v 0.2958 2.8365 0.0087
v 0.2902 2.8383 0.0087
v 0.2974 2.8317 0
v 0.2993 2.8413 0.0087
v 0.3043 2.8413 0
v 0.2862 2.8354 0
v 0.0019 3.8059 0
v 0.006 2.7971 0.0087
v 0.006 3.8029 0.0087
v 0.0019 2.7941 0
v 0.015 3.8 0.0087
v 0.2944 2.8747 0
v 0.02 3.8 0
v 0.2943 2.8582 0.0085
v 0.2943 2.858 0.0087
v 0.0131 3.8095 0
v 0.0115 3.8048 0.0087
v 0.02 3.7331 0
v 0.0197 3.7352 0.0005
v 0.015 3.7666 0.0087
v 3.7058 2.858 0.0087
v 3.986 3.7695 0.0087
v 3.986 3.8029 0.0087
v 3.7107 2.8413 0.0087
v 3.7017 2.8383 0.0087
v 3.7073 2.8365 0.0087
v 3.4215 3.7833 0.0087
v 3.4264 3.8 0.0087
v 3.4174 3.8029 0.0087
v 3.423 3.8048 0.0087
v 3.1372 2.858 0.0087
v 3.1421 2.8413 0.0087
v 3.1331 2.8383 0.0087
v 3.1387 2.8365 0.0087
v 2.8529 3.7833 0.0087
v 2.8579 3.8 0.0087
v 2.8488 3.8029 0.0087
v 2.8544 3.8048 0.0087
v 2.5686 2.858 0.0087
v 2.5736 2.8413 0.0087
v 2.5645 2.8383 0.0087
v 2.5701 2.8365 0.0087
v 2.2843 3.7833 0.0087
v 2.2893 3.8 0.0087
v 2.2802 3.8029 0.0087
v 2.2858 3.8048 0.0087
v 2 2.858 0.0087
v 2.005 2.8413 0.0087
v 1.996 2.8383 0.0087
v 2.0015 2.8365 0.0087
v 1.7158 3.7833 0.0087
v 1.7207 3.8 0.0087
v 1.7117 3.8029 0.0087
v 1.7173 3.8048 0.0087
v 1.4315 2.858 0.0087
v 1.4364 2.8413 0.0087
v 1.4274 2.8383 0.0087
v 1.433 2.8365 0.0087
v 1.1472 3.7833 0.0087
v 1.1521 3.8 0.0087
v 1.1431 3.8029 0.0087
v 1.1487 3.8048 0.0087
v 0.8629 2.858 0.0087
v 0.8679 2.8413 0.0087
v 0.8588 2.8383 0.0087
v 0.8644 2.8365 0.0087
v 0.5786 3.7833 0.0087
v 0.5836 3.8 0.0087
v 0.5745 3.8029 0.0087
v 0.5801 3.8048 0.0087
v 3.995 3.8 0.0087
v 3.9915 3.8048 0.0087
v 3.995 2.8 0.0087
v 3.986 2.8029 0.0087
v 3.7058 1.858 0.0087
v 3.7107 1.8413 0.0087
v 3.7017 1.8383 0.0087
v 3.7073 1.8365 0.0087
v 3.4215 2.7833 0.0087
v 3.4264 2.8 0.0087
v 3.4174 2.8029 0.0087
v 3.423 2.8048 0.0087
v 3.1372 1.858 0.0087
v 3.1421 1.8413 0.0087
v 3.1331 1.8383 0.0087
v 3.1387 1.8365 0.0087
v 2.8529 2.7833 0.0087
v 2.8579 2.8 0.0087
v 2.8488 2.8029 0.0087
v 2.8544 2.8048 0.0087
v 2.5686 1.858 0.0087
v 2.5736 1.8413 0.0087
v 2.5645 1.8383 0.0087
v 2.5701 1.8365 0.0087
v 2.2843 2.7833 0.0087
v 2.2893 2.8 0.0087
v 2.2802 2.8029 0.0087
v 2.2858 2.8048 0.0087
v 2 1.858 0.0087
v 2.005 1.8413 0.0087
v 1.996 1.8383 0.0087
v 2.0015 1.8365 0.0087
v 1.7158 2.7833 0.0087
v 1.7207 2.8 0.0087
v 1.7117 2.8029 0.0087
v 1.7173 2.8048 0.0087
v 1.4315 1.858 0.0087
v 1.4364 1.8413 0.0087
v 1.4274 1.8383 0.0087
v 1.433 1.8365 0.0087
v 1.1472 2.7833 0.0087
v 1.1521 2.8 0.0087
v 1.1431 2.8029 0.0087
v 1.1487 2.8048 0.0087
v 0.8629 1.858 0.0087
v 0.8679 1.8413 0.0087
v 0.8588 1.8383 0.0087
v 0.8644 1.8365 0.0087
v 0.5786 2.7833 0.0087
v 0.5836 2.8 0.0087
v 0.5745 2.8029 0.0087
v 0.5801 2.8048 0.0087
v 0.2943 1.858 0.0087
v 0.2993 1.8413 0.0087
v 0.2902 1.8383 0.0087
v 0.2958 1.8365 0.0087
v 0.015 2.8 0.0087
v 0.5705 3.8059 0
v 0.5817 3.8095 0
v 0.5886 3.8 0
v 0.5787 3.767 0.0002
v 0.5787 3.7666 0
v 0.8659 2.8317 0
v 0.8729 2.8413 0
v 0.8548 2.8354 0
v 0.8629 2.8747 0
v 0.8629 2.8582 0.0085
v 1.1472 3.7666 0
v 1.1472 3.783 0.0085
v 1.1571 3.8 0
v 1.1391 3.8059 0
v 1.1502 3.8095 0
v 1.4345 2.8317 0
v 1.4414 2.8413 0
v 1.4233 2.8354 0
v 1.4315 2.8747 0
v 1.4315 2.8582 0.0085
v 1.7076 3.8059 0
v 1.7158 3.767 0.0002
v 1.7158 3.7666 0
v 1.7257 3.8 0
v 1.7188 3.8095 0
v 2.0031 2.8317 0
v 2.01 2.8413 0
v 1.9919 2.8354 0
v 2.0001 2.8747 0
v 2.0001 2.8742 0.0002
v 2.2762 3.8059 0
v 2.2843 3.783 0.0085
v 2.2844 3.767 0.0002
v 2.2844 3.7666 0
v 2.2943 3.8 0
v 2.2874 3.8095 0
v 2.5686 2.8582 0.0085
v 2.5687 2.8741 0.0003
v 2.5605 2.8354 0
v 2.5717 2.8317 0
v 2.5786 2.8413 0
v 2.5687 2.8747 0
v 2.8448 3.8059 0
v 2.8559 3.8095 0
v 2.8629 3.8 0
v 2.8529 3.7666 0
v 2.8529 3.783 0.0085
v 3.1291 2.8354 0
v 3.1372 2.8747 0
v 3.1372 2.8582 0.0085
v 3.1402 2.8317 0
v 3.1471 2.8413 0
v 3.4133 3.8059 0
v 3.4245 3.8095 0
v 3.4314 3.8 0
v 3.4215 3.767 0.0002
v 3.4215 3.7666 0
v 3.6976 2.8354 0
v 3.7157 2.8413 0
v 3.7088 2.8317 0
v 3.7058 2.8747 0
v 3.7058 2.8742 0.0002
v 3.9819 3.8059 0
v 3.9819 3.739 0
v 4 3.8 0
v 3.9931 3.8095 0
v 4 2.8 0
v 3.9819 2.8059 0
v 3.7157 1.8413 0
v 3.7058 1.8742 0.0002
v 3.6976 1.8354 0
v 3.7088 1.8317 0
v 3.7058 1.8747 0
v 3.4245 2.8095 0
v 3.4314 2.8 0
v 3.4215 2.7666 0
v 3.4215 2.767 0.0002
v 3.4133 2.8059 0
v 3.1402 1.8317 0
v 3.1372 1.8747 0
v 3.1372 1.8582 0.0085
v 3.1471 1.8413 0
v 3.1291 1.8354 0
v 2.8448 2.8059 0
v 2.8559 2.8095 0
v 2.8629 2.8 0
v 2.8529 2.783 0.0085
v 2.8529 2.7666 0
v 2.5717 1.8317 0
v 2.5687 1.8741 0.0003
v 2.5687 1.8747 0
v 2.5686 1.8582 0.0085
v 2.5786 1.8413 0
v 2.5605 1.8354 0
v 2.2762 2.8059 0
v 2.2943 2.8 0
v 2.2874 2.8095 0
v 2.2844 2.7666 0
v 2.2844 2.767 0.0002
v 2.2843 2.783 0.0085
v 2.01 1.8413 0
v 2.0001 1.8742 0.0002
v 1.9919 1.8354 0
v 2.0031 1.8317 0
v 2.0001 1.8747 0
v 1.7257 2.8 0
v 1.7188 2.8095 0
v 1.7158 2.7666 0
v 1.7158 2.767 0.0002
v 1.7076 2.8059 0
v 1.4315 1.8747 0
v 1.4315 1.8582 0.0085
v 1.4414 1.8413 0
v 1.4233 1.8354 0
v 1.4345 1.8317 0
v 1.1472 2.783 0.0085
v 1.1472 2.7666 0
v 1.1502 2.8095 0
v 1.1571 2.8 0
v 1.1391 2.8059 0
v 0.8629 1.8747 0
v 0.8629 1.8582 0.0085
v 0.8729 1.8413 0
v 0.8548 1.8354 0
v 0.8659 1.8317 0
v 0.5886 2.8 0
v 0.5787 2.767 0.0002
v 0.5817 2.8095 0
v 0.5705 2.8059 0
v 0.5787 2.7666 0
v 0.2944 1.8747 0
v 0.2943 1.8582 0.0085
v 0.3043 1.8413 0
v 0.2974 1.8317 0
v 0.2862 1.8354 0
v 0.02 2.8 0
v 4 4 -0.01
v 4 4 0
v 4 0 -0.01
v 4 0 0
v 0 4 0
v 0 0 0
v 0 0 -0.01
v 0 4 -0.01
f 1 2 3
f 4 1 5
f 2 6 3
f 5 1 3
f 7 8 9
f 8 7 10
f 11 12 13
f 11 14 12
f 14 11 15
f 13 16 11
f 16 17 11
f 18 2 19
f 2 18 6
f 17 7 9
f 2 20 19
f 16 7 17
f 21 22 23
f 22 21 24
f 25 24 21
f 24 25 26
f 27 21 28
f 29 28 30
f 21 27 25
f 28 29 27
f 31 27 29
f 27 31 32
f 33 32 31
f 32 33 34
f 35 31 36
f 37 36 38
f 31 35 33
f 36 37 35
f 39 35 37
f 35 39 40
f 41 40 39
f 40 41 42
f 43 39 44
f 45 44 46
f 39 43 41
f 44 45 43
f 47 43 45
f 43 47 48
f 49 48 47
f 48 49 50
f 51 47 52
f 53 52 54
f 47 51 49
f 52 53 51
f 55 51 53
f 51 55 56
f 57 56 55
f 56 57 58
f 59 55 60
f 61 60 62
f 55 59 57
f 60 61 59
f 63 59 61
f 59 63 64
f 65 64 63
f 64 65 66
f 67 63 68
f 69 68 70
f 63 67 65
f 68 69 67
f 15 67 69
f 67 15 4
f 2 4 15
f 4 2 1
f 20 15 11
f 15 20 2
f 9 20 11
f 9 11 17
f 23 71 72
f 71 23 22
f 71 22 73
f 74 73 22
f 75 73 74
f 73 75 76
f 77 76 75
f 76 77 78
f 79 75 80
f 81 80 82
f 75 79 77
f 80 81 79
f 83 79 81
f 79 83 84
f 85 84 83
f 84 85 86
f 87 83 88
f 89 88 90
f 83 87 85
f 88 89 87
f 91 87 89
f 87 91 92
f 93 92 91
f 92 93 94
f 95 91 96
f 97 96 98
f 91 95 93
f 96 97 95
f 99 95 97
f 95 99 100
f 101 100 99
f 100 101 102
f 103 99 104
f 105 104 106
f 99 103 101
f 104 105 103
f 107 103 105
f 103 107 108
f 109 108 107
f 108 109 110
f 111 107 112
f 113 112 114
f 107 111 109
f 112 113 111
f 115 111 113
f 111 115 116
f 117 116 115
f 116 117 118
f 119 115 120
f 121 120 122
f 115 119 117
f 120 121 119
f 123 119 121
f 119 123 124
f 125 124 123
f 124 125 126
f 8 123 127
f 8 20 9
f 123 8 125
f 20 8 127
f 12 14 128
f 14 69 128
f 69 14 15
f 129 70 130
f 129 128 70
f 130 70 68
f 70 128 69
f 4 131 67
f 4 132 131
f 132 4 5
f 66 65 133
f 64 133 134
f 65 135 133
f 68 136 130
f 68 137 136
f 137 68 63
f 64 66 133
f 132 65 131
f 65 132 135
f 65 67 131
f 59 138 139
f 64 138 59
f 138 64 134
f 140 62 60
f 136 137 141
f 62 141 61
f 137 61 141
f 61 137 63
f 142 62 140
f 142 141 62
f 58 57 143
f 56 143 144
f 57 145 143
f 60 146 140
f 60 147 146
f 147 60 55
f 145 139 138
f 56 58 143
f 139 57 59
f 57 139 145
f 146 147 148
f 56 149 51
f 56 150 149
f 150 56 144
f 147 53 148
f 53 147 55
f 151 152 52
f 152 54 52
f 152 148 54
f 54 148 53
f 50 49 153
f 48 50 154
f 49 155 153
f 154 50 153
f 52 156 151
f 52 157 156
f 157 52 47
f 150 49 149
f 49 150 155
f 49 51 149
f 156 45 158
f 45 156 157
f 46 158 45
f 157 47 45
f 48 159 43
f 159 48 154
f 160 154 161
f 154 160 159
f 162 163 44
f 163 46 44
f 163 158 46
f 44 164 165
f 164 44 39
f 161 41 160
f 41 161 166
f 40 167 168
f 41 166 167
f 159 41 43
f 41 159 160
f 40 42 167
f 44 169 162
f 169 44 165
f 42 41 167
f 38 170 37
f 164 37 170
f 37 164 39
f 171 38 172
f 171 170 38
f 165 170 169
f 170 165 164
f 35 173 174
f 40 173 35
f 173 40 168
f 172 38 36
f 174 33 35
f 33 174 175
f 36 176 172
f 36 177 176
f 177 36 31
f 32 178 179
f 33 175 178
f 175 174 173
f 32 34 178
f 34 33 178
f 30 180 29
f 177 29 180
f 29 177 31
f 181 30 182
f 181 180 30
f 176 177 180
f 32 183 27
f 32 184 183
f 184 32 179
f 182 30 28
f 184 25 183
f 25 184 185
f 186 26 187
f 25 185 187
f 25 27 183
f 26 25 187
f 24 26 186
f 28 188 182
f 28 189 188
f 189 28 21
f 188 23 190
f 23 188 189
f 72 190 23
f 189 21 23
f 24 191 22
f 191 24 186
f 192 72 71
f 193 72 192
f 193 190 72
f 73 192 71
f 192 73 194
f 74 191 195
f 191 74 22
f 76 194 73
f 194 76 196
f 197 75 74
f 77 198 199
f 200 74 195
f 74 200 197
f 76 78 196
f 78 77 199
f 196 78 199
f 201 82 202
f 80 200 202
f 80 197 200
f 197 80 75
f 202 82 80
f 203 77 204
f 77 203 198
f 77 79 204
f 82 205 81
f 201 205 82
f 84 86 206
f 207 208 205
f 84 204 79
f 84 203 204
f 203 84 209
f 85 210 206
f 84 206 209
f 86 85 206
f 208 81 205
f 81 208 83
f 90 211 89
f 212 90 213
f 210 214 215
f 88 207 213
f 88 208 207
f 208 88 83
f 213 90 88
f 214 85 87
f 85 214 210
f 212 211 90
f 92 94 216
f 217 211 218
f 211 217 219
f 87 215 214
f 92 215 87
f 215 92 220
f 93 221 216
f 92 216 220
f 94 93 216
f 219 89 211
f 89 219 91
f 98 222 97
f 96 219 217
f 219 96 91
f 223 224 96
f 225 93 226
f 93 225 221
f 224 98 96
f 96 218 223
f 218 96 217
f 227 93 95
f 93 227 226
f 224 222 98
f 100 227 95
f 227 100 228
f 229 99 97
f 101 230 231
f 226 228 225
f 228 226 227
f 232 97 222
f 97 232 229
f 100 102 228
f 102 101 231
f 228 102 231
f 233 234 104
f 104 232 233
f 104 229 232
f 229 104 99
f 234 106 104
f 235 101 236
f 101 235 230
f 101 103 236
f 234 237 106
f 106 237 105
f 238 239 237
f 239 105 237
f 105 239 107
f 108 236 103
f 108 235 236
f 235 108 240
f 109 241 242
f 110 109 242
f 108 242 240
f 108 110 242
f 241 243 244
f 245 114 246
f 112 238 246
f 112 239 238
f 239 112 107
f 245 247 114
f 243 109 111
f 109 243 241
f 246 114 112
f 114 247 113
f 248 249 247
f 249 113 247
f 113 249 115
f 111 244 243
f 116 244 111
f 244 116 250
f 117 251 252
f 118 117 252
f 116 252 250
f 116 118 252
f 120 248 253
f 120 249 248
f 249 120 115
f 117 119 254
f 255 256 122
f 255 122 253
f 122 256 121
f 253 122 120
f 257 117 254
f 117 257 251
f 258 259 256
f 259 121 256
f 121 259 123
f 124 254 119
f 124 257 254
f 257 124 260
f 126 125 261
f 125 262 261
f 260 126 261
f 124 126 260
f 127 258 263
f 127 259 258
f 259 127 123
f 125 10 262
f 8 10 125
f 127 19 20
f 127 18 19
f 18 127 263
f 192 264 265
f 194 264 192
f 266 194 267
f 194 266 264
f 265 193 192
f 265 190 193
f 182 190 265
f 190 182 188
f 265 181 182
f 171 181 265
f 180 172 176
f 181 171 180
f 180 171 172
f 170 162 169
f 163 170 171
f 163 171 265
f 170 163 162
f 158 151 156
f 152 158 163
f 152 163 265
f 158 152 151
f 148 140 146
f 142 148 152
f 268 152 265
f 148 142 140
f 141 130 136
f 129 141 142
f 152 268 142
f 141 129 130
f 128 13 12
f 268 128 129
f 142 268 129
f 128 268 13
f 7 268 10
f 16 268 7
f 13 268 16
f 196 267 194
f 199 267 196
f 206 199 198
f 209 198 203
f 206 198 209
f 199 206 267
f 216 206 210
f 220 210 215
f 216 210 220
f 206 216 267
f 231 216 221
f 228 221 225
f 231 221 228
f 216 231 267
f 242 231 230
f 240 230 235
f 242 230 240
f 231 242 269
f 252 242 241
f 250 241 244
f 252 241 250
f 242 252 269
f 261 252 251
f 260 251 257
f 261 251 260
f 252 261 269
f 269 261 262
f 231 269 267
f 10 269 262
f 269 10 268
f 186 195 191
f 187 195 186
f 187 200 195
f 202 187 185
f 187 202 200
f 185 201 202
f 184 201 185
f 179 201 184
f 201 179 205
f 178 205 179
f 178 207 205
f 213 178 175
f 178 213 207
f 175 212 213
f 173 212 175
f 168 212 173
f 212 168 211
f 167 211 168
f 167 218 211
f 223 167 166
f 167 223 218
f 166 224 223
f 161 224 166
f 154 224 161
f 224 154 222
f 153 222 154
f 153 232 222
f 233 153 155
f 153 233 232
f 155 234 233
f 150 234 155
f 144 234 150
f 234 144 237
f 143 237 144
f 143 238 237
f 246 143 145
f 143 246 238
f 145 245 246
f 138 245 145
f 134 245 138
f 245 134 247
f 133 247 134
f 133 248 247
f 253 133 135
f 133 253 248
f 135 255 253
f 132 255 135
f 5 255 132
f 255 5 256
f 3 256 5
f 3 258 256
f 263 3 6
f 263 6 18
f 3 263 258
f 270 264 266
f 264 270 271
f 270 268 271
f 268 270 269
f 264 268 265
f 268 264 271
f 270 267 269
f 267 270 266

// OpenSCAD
hull(){
    translate([0.01, 3.8]) sphere(0.01);
    translate([0.2942857142857143, 2.841260385685]) sphere(0.01);
}
hull(){
    translate([0.2942857142857143, 2.841260385685]) sphere(0.01);
    translate([0.5785714285714286, 3.8]) sphere(0.01);
}
hull(){
    translate([0.5785714285714286, 3.8]) sphere(0.01);
    translate([0.8628571428571429, 2.841260385685]) sphere(0.01);
}
hull(){
    translate([0.8628571428571429, 2.841260385685]) sphere(0.01);
    translate([1.1471428571428572, 3.8]) sphere(0.01);
}
hull(){
    translate([1.1471428571428572, 3.8]) sphere(0.01);
    translate([1.4314285714285715, 2.841260385685]) sphere(0.01);
}
hull(){
    translate([1.4314285714285715, 2.841260385685]) sphere(0.01);
    translate([1.7157142857142857, 3.8]) sphere(0.01);
}
hull(){
    translate([1.7157142857142857, 3.8]) sphere(0.01);
    translate([2.0, 2.841260385685]) sphere(0.01);
}
hull(){
    translate([2.0, 2.841260385685]) sphere(0.01);
    translate([2.284285714285714, 3.8]) sphere(0.01);
}
hull(){
    translate([2.284285714285714, 3.8]) sphere(0.01);
    translate([2.568571428571429, 2.841260385685]) sphere(0.01);
}
hull(){
    translate([2.568571428571429, 2.841260385685]) sphere(0.01);
    translate([2.852857142857143, 3.8]) sphere(0.01);
}
hull(){
    translate([2.852857142857143, 3.8]) sphere(0.01);
    translate([3.137142857142857, 2.841260385685]) sphere(0.01);
}
hull(){
    translate([3.137142857142857, 2.841260385685]) sphere(0.01);
    translate([3.4214285714285717, 3.8]) sphere(0.01);
}
hull(){
    translate([3.4214285714285717, 3.8]) sphere(0.01);
    translate([3.7057142857142855, 2.841260385685]) sphere(0.01);
}
hull(){
    translate([3.7057142857142855, 2.841260385685]) sphere(0.01);
    translate([3.99, 3.8]) sphere(0.01);
}
hull(){
    translate([3.99, 3.8]) sphere(0.01);
    translate([3.99, 2.8]) sphere(0.01);
}
hull(){
    translate([3.99, 2.8]) sphere(0.01);
    translate([3.7057142857142855, 1.841260385685]) sphere(0.01);
}
hull(){
    translate([3.7057142857142855, 1.841260385685]) sphere(0.01);
    translate([3.4214285714285717, 2.8]) sphere(0.01);
}
hull(){
    translate([3.4214285714285717, 2.8]) sphere(0.01);
    translate([3.137142857142857, 1.841260385685]) sphere(0.01);
}
hull(){
    translate([3.137142857142857, 1.841260385685]) sphere(0.01);
    translate([2.852857142857143, 2.8]) sphere(0.01);
}
hull(){
    translate([2.852857142857143, 2.8]) sphere(0.01);
    translate([2.568571428571429, 1.841260385685]) sphere(0.01);
}
hull(){
    translate([2.568571428571429, 1.841260385685]) sphere(0.01);
    translate([2.284285714285714, 2.8]) sphere(0.01);
}
hull(){
    translate([2.284285714285714, 2.8]) sphere(0.01);
    translate([2.0, 1.841260385685]) sphere(0.01);
}
hull(){
    translate([2.0, 1.841260385685]) sphere(0.01);
    translate([1.7157142857142857, 2.8]) sphere(0.01);
}
hull(){
    translate([1.7157142857142857, 2.8]) sphere(0.01);
    translate([1.4314285714285715, 1.841260385685]) sphere(0.01);
}
hull(){
    translate([1.4314285714285715, 1.841260385685]) sphere(0.01);
    translate([1.1471428571428572, 2.8]) sphere(0.01);
}
hull(){
    translate([1.1471428571428572, 2.8]) sphere(0.01);
    translate([0.8628571428571429, 1.841260385685]) sphere(0.01);
}
hull(){
    translate([0.8628571428571429, 1.841260385685]) sphere(0.01);
    translate([0.5785714285714286, 2.8]) sphere(0.01);
}
hull(){
    translate([0.5785714285714286, 2.8]) sphere(0.01);
    translate([0.2942857142857143, 1.841260385685]) sphere(0.01);
}
hull(){
    translate([0.2942857142857143, 1.841260385685]) sphere(0.01);
    translate([0.01, 2.8]) sphere(0.01);
}
hull(){
    translate([0.01, 2.8]) sphere(0.01);
    translate([0.01, 3.8]) sphere(0.01);
}
translate([0,0,-0.01]) color([0.1,0.1,0.1]) cube([4,4,0.01]);
